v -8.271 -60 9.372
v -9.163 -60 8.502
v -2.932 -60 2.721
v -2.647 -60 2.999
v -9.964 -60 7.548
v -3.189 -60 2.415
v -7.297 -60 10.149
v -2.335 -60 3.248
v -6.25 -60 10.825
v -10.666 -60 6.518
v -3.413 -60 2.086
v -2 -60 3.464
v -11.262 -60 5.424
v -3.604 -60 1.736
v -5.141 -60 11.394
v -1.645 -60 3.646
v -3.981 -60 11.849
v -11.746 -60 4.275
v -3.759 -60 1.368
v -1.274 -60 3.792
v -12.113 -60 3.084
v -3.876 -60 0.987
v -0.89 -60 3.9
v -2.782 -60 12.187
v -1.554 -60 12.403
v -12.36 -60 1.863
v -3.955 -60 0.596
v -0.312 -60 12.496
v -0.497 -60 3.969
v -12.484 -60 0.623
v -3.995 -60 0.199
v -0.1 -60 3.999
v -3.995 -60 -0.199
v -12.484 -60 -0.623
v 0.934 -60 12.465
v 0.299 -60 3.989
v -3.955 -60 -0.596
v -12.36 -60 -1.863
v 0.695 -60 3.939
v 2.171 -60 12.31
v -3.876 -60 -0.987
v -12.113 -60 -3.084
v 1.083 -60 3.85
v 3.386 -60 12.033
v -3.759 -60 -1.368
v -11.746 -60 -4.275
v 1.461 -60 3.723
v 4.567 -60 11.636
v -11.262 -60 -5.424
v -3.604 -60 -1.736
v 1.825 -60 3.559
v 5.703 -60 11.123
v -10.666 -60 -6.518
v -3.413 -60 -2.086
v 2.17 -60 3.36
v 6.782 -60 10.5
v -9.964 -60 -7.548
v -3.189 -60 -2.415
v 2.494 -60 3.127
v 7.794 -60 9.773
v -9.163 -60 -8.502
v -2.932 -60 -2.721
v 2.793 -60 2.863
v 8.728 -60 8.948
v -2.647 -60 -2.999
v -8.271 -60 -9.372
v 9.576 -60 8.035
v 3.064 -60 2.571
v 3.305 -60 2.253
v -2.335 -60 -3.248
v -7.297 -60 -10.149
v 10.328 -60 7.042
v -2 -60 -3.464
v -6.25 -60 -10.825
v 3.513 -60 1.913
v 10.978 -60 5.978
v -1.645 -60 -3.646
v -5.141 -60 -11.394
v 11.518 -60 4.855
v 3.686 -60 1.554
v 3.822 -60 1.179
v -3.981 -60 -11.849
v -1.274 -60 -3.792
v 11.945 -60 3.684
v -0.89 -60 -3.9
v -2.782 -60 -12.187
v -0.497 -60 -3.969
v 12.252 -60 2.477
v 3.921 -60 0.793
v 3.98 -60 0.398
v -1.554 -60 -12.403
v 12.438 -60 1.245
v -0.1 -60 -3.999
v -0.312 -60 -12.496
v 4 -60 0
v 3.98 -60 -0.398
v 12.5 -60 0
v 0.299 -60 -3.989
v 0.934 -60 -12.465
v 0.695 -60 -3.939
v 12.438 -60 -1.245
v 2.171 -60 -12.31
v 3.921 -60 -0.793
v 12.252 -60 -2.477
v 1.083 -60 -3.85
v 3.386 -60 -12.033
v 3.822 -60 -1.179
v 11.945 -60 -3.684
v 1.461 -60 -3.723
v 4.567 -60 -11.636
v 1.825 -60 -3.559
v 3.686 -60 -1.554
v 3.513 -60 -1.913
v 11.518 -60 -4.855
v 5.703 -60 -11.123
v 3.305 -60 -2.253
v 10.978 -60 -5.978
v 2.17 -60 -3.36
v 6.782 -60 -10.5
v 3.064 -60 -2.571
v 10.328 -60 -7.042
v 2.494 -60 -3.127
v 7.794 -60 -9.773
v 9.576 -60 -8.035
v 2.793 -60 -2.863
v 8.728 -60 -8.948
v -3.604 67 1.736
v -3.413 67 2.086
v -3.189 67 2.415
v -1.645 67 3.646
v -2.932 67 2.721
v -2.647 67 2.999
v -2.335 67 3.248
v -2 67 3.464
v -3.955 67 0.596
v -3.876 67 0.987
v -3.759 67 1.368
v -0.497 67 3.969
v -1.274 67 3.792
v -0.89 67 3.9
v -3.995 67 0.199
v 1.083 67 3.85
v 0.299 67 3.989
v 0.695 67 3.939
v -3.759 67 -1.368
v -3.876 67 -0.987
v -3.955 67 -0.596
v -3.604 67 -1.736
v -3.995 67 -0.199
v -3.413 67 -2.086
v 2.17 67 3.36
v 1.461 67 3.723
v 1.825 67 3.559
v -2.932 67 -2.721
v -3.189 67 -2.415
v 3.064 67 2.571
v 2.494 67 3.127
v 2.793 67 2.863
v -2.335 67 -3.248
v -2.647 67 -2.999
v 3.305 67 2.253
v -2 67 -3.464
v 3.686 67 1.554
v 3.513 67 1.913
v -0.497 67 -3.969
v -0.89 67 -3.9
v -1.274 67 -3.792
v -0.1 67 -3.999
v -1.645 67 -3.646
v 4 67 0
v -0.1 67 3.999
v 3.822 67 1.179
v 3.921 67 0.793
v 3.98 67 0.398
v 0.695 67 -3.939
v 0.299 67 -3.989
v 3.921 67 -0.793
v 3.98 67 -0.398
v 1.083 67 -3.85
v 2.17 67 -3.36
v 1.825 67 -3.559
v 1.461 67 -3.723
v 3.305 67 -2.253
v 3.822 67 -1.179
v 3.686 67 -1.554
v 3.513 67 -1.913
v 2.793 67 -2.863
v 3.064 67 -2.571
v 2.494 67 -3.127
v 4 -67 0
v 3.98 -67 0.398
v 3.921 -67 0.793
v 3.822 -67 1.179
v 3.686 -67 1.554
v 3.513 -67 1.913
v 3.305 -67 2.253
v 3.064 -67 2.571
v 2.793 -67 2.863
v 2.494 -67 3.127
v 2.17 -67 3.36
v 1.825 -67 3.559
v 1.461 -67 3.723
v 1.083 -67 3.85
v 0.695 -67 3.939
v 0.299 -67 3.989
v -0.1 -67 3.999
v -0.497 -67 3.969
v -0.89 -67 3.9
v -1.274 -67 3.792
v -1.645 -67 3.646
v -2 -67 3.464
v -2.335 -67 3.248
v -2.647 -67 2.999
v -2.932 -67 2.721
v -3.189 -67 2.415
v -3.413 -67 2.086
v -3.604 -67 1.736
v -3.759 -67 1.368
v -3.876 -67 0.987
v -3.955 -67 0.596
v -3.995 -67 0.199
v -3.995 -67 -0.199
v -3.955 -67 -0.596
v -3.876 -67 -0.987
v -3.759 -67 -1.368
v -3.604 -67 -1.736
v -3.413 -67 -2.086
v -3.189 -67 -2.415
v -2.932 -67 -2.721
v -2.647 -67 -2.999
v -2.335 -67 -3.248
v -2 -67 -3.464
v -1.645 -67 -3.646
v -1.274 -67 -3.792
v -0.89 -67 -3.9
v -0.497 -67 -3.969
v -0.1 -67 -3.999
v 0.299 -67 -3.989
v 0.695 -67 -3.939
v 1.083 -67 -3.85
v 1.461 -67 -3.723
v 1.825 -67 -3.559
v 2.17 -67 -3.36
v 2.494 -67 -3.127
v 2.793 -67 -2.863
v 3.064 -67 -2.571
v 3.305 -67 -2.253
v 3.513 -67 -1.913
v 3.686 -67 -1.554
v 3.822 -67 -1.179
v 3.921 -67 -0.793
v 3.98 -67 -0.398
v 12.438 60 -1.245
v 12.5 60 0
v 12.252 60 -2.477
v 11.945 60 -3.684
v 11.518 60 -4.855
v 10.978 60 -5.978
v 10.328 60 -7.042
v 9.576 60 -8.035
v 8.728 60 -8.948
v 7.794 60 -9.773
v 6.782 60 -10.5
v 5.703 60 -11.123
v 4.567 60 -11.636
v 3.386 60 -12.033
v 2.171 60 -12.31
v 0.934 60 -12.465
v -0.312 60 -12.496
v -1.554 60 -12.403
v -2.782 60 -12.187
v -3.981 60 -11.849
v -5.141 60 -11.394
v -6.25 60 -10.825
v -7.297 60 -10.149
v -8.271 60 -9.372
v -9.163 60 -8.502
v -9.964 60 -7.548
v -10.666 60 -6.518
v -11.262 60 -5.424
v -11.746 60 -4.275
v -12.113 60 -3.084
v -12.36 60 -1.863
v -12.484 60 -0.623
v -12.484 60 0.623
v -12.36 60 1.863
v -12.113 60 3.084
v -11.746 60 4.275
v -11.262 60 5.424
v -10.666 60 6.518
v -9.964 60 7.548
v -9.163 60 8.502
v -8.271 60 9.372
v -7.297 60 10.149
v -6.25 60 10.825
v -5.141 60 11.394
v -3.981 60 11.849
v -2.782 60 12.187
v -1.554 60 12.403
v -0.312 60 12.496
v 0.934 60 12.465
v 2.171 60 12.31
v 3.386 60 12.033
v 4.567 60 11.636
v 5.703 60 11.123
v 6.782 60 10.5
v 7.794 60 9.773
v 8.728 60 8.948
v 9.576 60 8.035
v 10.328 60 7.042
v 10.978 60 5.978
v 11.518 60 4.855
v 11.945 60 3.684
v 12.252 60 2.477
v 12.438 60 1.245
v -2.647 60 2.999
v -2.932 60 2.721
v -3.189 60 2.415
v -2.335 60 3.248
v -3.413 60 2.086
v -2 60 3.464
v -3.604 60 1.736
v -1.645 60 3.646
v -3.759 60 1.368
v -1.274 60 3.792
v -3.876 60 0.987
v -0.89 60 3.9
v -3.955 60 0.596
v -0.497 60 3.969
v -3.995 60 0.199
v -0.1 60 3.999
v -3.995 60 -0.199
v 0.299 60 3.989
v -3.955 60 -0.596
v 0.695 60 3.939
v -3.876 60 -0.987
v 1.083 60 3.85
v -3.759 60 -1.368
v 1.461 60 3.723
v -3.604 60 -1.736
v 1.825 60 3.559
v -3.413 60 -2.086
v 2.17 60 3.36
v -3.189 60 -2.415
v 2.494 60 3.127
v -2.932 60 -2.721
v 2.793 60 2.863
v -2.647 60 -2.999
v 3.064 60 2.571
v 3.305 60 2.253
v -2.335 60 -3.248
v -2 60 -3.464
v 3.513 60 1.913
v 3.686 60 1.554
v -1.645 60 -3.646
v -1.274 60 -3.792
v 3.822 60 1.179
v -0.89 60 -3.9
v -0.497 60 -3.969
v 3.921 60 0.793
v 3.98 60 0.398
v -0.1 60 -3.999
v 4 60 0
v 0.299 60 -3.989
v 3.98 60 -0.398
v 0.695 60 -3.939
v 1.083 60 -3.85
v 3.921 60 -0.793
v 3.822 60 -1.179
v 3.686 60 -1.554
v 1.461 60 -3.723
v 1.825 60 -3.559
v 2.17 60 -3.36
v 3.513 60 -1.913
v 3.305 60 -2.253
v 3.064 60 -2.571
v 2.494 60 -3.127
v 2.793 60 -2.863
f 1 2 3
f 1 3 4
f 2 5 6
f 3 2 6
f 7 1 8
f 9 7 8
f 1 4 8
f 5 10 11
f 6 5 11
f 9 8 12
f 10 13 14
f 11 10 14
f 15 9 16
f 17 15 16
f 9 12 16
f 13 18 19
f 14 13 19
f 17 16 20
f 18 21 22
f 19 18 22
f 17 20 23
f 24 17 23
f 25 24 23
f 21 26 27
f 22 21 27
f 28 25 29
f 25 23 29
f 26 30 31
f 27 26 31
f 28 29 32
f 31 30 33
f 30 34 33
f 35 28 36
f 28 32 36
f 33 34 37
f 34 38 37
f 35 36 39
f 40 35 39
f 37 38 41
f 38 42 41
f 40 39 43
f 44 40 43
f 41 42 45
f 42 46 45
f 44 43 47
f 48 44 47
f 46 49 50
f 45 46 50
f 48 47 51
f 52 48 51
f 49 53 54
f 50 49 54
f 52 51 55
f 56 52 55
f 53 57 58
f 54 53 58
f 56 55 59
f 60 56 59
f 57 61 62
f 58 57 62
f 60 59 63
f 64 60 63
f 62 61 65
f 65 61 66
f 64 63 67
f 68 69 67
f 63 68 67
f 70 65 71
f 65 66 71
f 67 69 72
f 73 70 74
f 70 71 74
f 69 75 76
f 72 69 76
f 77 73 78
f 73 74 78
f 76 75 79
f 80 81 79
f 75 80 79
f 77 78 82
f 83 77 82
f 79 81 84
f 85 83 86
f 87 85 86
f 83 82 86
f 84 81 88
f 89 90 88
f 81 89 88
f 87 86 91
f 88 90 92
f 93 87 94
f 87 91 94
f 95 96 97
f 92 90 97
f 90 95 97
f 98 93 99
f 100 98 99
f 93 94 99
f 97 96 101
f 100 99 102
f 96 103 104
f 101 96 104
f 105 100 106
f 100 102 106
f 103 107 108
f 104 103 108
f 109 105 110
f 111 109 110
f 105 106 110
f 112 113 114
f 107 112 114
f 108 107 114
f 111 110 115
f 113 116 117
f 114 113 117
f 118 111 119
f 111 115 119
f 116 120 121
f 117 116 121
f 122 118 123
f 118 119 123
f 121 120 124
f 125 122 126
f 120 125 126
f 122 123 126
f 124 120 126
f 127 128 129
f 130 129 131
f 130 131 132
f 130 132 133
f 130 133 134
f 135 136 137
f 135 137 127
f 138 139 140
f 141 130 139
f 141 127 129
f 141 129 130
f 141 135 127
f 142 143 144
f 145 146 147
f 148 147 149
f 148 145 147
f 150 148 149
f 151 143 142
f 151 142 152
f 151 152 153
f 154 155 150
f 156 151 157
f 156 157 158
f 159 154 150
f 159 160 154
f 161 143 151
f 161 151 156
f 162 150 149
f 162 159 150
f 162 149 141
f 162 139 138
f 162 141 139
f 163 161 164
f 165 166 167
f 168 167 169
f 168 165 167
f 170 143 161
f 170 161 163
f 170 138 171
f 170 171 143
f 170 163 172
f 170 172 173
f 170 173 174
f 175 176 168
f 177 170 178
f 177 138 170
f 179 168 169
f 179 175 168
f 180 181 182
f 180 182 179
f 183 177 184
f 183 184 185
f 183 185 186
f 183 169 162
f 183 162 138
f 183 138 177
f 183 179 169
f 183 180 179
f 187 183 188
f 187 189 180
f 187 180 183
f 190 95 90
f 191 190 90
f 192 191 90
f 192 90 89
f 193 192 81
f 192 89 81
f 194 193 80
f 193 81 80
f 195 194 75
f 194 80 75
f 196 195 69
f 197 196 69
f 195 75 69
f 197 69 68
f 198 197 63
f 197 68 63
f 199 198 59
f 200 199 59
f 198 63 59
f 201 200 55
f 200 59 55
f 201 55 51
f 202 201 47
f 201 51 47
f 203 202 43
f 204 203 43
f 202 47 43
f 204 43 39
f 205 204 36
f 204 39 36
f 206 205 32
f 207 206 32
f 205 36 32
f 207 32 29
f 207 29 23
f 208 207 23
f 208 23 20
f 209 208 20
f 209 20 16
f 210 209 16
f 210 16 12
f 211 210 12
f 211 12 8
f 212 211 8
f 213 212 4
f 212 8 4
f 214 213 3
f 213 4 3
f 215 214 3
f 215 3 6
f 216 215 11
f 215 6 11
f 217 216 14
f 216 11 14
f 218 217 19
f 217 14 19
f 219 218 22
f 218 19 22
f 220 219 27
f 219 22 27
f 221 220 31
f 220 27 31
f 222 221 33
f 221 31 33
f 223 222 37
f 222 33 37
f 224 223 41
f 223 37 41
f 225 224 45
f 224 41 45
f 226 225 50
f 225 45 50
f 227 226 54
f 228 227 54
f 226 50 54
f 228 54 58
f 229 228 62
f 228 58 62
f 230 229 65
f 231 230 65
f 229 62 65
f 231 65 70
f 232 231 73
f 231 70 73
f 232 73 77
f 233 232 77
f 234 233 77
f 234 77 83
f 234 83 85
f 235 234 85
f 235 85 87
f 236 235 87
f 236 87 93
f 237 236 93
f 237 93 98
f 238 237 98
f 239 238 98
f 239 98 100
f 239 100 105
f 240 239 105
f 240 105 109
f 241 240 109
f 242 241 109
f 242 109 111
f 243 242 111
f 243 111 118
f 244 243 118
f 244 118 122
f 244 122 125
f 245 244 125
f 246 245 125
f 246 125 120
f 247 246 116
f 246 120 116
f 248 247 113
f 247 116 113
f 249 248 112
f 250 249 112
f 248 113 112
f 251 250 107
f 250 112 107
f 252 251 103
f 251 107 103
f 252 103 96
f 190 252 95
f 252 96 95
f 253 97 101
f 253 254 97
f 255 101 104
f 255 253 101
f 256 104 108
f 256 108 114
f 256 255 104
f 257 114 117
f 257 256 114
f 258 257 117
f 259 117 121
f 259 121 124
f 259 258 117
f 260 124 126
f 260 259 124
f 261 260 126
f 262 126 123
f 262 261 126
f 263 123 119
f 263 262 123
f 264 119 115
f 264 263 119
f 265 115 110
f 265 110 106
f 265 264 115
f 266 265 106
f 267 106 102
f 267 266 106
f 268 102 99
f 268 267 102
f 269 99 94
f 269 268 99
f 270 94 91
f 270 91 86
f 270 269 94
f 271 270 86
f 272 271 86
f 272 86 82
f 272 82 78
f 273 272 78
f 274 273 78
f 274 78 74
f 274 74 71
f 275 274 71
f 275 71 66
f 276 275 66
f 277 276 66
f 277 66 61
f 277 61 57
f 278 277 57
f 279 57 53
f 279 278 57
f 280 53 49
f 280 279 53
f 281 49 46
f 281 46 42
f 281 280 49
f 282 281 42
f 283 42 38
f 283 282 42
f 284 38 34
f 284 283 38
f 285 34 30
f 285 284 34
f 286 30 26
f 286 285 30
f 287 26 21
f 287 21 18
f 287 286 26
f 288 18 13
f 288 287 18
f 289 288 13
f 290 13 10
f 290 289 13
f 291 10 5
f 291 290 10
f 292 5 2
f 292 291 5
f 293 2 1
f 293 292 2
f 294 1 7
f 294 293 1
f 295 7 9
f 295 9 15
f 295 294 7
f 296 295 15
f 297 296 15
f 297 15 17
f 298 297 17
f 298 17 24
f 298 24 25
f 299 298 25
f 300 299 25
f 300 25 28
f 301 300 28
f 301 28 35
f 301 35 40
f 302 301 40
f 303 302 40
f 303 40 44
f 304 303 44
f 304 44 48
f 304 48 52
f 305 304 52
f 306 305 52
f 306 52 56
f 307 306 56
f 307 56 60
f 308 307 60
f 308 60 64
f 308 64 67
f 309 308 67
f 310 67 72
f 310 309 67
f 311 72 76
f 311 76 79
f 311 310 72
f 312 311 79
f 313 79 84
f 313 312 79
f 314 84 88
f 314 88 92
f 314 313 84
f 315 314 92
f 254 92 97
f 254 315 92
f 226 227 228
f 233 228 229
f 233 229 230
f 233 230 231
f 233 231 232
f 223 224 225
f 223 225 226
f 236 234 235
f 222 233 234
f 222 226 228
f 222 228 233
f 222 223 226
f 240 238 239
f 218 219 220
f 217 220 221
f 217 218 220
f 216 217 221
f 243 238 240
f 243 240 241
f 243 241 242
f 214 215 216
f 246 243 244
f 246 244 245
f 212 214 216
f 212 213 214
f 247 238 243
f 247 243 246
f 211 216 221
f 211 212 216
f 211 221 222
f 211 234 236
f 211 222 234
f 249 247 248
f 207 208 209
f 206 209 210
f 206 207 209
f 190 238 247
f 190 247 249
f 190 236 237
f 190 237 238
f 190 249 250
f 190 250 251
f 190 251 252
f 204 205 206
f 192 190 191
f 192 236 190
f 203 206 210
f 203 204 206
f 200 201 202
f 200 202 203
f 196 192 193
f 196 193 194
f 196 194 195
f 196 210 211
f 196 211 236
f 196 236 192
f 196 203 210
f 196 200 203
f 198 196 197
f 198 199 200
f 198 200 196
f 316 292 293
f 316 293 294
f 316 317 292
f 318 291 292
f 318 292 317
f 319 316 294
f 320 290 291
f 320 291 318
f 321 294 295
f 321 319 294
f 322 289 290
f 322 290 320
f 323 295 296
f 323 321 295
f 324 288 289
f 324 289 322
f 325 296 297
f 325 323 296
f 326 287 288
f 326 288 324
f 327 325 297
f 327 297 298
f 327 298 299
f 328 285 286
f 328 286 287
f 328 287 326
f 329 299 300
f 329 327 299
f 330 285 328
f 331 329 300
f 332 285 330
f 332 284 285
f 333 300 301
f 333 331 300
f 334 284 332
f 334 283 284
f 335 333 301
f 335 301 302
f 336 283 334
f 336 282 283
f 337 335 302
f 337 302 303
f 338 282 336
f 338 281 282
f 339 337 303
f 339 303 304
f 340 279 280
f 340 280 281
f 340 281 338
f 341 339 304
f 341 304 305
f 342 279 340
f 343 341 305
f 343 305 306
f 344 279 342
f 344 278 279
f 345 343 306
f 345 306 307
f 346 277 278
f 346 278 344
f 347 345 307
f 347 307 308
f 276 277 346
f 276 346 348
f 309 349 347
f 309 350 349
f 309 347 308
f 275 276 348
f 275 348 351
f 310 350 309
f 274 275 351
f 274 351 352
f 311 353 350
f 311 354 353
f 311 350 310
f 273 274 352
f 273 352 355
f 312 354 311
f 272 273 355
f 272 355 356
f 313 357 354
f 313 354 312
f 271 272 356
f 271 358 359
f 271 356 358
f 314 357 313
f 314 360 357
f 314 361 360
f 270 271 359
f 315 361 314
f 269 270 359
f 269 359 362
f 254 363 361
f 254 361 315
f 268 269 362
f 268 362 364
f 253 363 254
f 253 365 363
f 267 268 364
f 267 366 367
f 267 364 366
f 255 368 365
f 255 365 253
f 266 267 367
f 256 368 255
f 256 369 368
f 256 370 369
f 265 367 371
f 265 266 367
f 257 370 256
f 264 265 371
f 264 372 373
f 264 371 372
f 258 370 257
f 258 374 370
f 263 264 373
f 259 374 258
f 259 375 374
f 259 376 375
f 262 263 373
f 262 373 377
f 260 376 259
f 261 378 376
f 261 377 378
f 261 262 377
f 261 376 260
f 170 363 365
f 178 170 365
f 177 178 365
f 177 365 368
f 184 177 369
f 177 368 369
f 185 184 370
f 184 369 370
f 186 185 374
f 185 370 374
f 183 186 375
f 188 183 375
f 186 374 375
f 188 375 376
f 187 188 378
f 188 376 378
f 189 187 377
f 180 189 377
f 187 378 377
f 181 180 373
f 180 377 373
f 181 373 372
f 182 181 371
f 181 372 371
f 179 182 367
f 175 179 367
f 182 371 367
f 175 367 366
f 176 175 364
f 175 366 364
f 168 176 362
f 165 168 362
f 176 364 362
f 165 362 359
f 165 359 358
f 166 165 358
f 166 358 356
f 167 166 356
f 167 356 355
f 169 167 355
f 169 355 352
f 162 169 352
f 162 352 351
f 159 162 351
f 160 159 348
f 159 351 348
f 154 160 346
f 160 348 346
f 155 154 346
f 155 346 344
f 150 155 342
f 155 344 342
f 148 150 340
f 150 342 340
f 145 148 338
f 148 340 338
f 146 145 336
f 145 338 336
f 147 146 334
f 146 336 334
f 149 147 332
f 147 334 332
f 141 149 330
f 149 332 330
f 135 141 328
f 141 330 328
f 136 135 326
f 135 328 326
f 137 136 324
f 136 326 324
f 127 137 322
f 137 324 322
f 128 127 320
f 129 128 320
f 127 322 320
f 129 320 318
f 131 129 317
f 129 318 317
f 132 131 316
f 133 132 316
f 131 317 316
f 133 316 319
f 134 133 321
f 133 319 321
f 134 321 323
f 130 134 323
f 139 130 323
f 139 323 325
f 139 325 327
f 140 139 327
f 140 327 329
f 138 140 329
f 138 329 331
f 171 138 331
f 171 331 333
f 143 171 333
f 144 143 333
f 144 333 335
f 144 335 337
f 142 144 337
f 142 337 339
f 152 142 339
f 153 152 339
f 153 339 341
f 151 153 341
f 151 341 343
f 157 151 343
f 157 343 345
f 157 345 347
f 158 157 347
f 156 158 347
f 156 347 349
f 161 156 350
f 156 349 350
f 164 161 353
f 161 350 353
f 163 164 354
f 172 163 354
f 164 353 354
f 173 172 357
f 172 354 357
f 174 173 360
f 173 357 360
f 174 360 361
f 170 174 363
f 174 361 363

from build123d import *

# Parameters (mm, degrees)
BOSS_EXTRUDE1_DEPTH      = 60
BOSS_EXTRUDE1_DEPTH_BACK = 60
SKETCH1_R                = 12.5
SKETCH2_R                = 4
BOSS_EXTRUDE2_DEPTH      = 7
BOSS_EXTRUDE3_START      = 7
SKETCH3_R                = 4
BOSS_EXTRUDE3_DEPTH      = 7


with BuildPart() as part:
    # Sketch1 → Boss-Extrude1 (new, two sides: drawn at the far end of the back side and taken through both)
    with BuildSketch(Plane(origin=(0, 0, 0), x_dir=(1, 0, 0), z_dir=(0, 1, 0)).offset(-BOSS_EXTRUDE1_DEPTH_BACK)):
        Circle(SKETCH1_R)
    extrude(amount=BOSS_EXTRUDE1_DEPTH + BOSS_EXTRUDE1_DEPTH_BACK)

    # Sketch2 → Boss-Extrude2 (add)
    with BuildSketch(Plane(origin=(0, 60, 0), x_dir=(1, 0, 0), z_dir=(0, 1, 0))):
        Circle(SKETCH2_R)
    extrude(amount=BOSS_EXTRUDE2_DEPTH)

    # Sketch3 → Boss-Extrude3 (add)
    with BuildSketch(Plane.XZ.offset(60).offset(BOSS_EXTRUDE3_START)):
        Circle(SKETCH3_R)
    extrude(amount=-BOSS_EXTRUDE3_DEPTH)


solid = part.part
